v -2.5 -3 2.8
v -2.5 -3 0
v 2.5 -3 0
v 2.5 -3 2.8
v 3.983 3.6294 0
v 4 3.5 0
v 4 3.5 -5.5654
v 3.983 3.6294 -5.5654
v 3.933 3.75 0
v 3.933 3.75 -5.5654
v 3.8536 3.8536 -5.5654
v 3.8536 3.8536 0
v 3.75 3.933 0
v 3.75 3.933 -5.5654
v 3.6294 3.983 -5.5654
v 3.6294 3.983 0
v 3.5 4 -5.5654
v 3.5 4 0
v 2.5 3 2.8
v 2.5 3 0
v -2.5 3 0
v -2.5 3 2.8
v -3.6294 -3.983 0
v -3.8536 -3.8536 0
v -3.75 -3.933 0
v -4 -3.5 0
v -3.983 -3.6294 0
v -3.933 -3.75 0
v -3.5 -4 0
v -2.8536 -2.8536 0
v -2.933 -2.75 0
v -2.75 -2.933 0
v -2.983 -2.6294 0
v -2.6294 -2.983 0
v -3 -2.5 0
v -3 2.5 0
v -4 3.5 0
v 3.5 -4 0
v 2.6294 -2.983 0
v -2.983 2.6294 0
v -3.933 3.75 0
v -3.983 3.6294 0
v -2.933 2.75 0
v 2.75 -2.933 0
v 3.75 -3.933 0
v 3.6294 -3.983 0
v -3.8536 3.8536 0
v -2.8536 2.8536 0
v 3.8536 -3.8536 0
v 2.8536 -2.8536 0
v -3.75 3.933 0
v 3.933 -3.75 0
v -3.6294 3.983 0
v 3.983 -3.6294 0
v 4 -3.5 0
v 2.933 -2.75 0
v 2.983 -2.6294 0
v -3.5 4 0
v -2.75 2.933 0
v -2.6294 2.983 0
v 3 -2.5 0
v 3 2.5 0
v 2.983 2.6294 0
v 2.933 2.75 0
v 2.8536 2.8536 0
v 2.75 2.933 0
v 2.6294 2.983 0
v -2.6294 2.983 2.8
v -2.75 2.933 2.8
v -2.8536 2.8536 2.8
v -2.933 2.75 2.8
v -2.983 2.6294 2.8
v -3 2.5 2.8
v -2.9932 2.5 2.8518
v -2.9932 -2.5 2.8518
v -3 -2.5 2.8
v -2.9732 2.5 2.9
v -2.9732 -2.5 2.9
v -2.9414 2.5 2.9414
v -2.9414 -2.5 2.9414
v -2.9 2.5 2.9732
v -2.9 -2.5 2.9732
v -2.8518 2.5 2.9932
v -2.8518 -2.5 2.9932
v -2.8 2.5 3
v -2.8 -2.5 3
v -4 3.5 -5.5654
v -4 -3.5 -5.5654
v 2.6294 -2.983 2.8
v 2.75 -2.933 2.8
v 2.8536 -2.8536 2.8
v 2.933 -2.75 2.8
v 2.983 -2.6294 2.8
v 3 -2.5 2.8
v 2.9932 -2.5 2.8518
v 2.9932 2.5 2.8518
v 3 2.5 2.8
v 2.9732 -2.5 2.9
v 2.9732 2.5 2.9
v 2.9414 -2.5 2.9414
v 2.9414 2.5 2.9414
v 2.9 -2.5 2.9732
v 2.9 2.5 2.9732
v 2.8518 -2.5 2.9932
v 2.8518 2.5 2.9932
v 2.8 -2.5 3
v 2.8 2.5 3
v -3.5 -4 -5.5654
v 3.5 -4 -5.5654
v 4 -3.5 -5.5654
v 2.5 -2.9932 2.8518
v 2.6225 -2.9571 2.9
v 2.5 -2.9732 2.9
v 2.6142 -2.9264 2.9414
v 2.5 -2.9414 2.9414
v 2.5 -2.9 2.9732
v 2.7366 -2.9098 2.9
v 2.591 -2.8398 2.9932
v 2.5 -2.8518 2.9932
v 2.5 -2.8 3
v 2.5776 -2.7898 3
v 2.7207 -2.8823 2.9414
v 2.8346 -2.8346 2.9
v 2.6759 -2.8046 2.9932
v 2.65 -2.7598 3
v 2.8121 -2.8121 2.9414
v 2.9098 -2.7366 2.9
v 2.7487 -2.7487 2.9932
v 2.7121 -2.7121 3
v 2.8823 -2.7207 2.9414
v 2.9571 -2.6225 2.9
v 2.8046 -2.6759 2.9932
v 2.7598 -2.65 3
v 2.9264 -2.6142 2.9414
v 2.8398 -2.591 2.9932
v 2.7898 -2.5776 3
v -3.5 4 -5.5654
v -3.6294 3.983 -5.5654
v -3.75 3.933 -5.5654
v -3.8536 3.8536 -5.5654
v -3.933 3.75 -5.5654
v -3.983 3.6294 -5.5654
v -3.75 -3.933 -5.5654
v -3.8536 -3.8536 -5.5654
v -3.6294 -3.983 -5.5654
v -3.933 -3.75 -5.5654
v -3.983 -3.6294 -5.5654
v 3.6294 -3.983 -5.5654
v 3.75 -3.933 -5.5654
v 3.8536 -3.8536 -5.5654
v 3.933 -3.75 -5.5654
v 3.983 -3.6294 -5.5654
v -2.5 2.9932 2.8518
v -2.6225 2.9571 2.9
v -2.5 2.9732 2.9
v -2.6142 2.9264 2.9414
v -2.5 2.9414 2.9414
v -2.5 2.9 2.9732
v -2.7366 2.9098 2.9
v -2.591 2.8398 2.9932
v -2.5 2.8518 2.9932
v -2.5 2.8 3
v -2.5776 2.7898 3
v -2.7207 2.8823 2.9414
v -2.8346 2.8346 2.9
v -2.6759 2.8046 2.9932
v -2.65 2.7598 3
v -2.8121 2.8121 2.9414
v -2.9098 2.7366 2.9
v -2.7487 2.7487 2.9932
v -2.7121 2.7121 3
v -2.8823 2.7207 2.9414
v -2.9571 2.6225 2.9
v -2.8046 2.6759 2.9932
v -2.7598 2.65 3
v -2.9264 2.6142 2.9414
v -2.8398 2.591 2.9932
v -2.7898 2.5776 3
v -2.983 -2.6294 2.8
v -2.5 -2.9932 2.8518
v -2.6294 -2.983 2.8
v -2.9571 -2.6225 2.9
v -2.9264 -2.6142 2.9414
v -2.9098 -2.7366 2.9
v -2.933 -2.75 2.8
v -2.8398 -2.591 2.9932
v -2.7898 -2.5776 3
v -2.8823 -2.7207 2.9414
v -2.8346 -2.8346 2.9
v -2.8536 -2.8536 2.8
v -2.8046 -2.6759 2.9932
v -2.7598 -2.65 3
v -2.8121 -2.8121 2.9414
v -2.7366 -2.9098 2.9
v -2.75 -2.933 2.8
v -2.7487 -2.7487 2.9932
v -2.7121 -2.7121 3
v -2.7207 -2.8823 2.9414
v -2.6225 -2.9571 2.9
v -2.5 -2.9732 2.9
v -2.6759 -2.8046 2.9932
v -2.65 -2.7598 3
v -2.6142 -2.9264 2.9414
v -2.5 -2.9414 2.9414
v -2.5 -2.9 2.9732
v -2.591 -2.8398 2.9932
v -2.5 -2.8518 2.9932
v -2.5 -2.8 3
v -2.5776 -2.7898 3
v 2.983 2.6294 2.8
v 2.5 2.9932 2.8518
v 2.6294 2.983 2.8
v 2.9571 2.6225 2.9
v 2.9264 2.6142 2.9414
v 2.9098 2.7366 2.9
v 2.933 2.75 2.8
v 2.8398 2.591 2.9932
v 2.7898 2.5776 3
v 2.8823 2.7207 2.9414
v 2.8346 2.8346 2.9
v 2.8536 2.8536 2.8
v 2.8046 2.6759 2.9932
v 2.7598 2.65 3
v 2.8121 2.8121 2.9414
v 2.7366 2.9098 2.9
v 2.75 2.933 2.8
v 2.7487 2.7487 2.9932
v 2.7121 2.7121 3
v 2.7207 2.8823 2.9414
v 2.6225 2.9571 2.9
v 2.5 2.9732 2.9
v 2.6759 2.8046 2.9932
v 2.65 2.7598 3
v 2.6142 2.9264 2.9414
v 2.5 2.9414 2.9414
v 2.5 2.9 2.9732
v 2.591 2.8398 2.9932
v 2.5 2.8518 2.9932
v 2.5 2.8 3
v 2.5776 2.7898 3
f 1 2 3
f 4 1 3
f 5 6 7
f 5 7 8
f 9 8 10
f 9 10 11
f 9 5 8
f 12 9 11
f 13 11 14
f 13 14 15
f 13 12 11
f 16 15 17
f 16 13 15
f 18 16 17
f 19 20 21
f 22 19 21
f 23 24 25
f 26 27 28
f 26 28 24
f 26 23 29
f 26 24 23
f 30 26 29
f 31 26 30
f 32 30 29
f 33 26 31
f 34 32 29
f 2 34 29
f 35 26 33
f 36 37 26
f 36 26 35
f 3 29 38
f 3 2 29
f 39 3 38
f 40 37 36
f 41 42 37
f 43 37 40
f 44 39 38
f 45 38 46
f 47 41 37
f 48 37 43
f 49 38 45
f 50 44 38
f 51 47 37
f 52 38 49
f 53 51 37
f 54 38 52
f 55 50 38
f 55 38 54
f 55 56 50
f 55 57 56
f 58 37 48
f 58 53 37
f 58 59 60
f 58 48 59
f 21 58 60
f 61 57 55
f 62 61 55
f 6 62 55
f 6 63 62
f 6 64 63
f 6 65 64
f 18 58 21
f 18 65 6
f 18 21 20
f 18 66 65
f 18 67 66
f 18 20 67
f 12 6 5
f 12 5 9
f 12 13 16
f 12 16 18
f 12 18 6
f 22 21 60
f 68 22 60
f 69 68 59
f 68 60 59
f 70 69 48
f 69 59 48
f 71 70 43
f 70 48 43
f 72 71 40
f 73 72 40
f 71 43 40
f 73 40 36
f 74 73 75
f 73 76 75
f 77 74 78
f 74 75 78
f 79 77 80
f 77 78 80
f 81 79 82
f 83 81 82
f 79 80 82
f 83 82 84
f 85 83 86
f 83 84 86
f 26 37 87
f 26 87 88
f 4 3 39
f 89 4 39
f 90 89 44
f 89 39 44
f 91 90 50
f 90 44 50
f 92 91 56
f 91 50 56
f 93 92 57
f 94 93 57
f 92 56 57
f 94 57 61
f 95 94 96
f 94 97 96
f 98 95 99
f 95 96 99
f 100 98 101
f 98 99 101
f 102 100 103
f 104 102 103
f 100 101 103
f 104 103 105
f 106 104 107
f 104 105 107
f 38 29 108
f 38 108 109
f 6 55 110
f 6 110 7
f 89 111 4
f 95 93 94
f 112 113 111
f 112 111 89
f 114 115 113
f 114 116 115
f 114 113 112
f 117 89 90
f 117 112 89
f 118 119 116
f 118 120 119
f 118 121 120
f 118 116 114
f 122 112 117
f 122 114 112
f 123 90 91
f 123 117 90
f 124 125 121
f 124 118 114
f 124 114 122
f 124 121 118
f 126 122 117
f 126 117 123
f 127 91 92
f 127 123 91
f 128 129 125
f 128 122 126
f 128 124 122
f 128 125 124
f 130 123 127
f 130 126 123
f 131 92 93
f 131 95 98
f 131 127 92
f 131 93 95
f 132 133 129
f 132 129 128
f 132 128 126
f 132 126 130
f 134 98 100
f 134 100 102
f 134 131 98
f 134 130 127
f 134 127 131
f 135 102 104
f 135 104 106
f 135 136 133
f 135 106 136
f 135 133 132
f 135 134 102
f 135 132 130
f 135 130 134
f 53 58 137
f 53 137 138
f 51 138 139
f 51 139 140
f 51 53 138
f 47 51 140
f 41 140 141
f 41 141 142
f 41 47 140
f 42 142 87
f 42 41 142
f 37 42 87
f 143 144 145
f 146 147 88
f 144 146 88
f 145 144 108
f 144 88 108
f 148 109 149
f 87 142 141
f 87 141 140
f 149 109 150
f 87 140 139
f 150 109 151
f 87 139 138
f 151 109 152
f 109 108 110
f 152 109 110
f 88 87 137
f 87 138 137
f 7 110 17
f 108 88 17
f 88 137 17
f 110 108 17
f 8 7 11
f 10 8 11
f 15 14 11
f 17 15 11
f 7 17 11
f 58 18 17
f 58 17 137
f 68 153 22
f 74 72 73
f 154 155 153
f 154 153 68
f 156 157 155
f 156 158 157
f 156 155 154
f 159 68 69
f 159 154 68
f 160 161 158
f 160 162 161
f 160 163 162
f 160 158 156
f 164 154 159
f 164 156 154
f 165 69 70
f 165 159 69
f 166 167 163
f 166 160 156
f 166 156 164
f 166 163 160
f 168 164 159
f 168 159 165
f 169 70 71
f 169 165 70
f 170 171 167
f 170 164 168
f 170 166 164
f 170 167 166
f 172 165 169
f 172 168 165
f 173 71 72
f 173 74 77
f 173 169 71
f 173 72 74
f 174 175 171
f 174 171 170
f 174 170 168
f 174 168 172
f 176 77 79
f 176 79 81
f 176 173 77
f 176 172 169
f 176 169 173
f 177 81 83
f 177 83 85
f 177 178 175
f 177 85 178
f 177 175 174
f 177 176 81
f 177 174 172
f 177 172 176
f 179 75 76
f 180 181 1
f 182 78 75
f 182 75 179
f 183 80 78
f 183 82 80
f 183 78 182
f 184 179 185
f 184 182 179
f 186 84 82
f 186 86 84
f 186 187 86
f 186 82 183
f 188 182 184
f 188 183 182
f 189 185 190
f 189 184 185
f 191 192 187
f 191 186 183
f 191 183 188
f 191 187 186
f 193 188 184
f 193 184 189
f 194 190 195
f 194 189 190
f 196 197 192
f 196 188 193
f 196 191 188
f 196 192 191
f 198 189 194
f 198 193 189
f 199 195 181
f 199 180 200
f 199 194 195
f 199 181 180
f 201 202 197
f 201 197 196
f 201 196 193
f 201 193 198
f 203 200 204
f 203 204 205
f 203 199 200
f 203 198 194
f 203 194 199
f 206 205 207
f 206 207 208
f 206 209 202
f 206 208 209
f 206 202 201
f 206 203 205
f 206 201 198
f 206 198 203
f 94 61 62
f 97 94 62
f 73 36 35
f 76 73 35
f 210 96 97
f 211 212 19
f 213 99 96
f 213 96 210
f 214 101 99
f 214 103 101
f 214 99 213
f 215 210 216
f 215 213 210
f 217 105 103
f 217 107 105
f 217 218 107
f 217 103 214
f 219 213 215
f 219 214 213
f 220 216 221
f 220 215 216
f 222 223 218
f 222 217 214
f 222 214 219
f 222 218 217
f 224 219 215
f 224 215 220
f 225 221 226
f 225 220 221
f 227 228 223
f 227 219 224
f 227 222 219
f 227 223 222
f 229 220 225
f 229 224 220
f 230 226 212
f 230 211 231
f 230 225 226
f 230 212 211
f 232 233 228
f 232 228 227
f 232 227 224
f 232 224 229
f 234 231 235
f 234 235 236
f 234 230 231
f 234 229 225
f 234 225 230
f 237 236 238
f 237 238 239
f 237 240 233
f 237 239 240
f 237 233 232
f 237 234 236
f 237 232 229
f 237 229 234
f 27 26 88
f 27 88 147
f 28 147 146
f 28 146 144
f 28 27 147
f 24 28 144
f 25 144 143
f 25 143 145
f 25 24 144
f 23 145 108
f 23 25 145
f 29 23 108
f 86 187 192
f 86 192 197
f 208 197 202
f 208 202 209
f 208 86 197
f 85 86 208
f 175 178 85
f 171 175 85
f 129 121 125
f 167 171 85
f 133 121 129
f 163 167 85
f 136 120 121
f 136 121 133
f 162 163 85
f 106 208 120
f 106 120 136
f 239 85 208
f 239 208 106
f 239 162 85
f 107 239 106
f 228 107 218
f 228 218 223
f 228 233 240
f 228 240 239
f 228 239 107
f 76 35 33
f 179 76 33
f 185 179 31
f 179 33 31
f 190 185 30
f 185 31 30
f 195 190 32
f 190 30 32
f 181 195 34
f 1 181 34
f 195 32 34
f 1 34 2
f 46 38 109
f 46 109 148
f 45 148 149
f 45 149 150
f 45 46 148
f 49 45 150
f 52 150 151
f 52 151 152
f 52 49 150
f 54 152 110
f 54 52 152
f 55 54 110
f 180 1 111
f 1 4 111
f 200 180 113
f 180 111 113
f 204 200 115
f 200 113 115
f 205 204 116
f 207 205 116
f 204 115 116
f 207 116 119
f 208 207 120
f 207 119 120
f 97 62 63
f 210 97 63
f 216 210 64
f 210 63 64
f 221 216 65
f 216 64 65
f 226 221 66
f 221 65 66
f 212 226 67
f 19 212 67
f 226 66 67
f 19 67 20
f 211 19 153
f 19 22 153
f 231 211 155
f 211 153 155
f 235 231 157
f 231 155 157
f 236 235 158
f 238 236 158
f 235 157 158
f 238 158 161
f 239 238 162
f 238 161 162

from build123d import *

# Parameters (mm, degrees)
BOSS_EXTRU_1_DEPTH = 3
CONG_1_R           = 0.2
BOSS_EXTRU_2_DEPTH = 5.565397746


with BuildPart() as part:
    # Esquisse1 → Boss.-Extru.1 (new body)
    with BuildSketch(Plane.XY):
        with BuildLine():
            Line((-2.5, -3), (2.5, -3))
            ThreePointArc((2.5, -3), (2.853553391, -2.853553391), (3, -2.5))
            Line((3, -2.5), (3, 2.5))
            ThreePointArc((3, 2.5), (2.853553391, 2.853553391), (2.5, 3))
            Line((2.5, 3), (-2.5, 3))
            ThreePointArc((-2.5, 3), (-2.853553391, 2.853553391), (-3, 2.5))
            Line((-3, 2.5), (-3, -2.5))
            ThreePointArc((-3, -2.5), (-2.853553391, -2.853553391), (-2.5, -3))
        make_face()
    extrude(amount=BOSS_EXTRU_1_DEPTH)

    # Congé1
    cong_1_edges = [part.edges().sort_by_distance(p)[0] for p in [
        (2.853553391, -2.853553391, 3),
        (3, 0, 3),
        (2.853553391, 2.853553391, 3),
        (0, 3, 3),
        (-2.853553391, 2.853553391, 3),
        (-3, 0, 3),
        (-2.853553391, -2.853553391, 3),
        (0, -3, 3),
    ]]
    fillet(cong_1_edges, radius=CONG_1_R)

    # Esquisse2 → Boss.-Extru.2 (add)
    with BuildSketch(Plane.XY):
        with BuildLine():
            Line((-3.5, -4), (3.5, -4))
            ThreePointArc((3.5, -4), (3.853553391, -3.853553391), (4, -3.5))
            Line((4, -3.5), (4, 3.5))
            ThreePointArc((4, 3.5), (3.853553391, 3.853553391), (3.5, 4))
            Line((3.5, 4), (-3.5, 4))
            ThreePointArc((-3.5, 4), (-3.853553391, 3.853553391), (-4, 3.5))
            Line((-4, 3.5), (-4, -3.5))
            ThreePointArc((-4, -3.5), (-3.853553391, -3.853553391), (-3.5, -4))
        make_face()
    extrude(amount=-BOSS_EXTRU_2_DEPTH)


solid = part.part
